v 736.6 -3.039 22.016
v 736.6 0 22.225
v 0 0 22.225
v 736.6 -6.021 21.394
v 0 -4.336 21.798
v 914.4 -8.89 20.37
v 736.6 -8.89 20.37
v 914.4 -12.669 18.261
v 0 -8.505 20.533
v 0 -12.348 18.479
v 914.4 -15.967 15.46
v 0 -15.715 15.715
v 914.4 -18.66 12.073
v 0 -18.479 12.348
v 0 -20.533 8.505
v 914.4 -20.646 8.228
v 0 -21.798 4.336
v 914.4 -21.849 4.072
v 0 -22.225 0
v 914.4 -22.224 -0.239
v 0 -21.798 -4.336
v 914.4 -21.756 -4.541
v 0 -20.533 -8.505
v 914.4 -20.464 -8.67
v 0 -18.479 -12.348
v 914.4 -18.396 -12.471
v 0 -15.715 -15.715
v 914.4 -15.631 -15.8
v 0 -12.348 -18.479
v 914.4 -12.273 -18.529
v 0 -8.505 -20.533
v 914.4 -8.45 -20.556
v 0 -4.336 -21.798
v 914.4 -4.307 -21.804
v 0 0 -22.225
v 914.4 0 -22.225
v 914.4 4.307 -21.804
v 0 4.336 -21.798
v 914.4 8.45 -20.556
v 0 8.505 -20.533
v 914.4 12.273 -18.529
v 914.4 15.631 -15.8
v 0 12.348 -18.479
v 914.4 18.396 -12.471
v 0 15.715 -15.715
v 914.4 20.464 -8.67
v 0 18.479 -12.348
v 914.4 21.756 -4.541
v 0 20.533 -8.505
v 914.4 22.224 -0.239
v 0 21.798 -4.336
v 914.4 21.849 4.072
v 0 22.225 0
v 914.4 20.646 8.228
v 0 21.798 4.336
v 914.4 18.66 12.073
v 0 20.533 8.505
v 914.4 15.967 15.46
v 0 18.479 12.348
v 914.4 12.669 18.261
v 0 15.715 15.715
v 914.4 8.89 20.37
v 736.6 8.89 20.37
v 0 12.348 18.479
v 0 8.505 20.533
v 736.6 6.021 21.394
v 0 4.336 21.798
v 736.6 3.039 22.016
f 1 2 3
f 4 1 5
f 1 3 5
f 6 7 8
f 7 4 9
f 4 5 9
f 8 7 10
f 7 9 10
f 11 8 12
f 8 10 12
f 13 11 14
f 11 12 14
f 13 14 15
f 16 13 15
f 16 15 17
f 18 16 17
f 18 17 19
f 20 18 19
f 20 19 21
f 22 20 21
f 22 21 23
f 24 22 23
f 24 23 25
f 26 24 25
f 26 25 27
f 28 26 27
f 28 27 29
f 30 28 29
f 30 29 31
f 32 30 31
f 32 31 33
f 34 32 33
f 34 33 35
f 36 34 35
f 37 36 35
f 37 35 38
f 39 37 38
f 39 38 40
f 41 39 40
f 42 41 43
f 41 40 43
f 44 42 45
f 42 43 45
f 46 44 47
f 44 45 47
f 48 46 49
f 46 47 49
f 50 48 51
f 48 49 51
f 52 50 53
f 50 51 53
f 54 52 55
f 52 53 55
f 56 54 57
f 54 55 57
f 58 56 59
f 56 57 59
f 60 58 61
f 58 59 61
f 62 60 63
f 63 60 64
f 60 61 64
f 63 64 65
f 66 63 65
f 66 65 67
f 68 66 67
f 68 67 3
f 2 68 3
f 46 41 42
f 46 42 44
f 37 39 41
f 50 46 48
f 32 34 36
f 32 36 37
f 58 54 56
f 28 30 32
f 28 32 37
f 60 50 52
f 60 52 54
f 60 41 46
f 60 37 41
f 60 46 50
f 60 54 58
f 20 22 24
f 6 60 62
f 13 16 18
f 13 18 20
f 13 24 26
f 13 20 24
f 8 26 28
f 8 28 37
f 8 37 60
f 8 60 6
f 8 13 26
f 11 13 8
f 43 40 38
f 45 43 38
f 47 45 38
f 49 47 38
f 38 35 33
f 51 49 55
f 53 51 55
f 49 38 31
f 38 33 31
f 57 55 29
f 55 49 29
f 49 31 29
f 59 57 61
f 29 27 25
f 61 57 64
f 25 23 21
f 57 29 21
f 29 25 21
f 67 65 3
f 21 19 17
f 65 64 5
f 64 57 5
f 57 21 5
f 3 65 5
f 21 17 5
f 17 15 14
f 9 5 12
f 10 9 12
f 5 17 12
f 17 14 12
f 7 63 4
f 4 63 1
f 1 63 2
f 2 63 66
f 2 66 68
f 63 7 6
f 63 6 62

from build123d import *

# Parameters (mm, degrees)
F0_R     = 22.225
F1_DEPTH = 914.4
F3_DEPTH = 177.8
F4_ANGLE = 90


with BuildPart() as f1:
    # F0 (on Right) → F1 (new body)
    with BuildSketch(Plane.YZ):
        Circle(F0_R)
    extrude(amount=F1_DEPTH)

    # F2 (on face) → F3 (cut)
    with BuildSketch(Plane.YZ.offset(914.4)):
        with BuildLine():
            Line((20.3695489641, 8.89), (20.3695489641, -8.89))
            ThreePointArc((20.3695489641, -8.89), (21.7561928049, -4.540781831), (22.225, 0))
            ThreePointArc((22.225, 0), (21.7561928049, 4.540781831), (20.3695489641, 8.89))
        make_face()
    extrude(amount=-F3_DEPTH, mode=Mode.SUBTRACT)


with BuildPart() as f1_1:
    # F4: moved
    add(f1.part.rotate(Axis((0, 0, 0), (1, 0, 0)), F4_ANGLE))


solid = f1_1.part
